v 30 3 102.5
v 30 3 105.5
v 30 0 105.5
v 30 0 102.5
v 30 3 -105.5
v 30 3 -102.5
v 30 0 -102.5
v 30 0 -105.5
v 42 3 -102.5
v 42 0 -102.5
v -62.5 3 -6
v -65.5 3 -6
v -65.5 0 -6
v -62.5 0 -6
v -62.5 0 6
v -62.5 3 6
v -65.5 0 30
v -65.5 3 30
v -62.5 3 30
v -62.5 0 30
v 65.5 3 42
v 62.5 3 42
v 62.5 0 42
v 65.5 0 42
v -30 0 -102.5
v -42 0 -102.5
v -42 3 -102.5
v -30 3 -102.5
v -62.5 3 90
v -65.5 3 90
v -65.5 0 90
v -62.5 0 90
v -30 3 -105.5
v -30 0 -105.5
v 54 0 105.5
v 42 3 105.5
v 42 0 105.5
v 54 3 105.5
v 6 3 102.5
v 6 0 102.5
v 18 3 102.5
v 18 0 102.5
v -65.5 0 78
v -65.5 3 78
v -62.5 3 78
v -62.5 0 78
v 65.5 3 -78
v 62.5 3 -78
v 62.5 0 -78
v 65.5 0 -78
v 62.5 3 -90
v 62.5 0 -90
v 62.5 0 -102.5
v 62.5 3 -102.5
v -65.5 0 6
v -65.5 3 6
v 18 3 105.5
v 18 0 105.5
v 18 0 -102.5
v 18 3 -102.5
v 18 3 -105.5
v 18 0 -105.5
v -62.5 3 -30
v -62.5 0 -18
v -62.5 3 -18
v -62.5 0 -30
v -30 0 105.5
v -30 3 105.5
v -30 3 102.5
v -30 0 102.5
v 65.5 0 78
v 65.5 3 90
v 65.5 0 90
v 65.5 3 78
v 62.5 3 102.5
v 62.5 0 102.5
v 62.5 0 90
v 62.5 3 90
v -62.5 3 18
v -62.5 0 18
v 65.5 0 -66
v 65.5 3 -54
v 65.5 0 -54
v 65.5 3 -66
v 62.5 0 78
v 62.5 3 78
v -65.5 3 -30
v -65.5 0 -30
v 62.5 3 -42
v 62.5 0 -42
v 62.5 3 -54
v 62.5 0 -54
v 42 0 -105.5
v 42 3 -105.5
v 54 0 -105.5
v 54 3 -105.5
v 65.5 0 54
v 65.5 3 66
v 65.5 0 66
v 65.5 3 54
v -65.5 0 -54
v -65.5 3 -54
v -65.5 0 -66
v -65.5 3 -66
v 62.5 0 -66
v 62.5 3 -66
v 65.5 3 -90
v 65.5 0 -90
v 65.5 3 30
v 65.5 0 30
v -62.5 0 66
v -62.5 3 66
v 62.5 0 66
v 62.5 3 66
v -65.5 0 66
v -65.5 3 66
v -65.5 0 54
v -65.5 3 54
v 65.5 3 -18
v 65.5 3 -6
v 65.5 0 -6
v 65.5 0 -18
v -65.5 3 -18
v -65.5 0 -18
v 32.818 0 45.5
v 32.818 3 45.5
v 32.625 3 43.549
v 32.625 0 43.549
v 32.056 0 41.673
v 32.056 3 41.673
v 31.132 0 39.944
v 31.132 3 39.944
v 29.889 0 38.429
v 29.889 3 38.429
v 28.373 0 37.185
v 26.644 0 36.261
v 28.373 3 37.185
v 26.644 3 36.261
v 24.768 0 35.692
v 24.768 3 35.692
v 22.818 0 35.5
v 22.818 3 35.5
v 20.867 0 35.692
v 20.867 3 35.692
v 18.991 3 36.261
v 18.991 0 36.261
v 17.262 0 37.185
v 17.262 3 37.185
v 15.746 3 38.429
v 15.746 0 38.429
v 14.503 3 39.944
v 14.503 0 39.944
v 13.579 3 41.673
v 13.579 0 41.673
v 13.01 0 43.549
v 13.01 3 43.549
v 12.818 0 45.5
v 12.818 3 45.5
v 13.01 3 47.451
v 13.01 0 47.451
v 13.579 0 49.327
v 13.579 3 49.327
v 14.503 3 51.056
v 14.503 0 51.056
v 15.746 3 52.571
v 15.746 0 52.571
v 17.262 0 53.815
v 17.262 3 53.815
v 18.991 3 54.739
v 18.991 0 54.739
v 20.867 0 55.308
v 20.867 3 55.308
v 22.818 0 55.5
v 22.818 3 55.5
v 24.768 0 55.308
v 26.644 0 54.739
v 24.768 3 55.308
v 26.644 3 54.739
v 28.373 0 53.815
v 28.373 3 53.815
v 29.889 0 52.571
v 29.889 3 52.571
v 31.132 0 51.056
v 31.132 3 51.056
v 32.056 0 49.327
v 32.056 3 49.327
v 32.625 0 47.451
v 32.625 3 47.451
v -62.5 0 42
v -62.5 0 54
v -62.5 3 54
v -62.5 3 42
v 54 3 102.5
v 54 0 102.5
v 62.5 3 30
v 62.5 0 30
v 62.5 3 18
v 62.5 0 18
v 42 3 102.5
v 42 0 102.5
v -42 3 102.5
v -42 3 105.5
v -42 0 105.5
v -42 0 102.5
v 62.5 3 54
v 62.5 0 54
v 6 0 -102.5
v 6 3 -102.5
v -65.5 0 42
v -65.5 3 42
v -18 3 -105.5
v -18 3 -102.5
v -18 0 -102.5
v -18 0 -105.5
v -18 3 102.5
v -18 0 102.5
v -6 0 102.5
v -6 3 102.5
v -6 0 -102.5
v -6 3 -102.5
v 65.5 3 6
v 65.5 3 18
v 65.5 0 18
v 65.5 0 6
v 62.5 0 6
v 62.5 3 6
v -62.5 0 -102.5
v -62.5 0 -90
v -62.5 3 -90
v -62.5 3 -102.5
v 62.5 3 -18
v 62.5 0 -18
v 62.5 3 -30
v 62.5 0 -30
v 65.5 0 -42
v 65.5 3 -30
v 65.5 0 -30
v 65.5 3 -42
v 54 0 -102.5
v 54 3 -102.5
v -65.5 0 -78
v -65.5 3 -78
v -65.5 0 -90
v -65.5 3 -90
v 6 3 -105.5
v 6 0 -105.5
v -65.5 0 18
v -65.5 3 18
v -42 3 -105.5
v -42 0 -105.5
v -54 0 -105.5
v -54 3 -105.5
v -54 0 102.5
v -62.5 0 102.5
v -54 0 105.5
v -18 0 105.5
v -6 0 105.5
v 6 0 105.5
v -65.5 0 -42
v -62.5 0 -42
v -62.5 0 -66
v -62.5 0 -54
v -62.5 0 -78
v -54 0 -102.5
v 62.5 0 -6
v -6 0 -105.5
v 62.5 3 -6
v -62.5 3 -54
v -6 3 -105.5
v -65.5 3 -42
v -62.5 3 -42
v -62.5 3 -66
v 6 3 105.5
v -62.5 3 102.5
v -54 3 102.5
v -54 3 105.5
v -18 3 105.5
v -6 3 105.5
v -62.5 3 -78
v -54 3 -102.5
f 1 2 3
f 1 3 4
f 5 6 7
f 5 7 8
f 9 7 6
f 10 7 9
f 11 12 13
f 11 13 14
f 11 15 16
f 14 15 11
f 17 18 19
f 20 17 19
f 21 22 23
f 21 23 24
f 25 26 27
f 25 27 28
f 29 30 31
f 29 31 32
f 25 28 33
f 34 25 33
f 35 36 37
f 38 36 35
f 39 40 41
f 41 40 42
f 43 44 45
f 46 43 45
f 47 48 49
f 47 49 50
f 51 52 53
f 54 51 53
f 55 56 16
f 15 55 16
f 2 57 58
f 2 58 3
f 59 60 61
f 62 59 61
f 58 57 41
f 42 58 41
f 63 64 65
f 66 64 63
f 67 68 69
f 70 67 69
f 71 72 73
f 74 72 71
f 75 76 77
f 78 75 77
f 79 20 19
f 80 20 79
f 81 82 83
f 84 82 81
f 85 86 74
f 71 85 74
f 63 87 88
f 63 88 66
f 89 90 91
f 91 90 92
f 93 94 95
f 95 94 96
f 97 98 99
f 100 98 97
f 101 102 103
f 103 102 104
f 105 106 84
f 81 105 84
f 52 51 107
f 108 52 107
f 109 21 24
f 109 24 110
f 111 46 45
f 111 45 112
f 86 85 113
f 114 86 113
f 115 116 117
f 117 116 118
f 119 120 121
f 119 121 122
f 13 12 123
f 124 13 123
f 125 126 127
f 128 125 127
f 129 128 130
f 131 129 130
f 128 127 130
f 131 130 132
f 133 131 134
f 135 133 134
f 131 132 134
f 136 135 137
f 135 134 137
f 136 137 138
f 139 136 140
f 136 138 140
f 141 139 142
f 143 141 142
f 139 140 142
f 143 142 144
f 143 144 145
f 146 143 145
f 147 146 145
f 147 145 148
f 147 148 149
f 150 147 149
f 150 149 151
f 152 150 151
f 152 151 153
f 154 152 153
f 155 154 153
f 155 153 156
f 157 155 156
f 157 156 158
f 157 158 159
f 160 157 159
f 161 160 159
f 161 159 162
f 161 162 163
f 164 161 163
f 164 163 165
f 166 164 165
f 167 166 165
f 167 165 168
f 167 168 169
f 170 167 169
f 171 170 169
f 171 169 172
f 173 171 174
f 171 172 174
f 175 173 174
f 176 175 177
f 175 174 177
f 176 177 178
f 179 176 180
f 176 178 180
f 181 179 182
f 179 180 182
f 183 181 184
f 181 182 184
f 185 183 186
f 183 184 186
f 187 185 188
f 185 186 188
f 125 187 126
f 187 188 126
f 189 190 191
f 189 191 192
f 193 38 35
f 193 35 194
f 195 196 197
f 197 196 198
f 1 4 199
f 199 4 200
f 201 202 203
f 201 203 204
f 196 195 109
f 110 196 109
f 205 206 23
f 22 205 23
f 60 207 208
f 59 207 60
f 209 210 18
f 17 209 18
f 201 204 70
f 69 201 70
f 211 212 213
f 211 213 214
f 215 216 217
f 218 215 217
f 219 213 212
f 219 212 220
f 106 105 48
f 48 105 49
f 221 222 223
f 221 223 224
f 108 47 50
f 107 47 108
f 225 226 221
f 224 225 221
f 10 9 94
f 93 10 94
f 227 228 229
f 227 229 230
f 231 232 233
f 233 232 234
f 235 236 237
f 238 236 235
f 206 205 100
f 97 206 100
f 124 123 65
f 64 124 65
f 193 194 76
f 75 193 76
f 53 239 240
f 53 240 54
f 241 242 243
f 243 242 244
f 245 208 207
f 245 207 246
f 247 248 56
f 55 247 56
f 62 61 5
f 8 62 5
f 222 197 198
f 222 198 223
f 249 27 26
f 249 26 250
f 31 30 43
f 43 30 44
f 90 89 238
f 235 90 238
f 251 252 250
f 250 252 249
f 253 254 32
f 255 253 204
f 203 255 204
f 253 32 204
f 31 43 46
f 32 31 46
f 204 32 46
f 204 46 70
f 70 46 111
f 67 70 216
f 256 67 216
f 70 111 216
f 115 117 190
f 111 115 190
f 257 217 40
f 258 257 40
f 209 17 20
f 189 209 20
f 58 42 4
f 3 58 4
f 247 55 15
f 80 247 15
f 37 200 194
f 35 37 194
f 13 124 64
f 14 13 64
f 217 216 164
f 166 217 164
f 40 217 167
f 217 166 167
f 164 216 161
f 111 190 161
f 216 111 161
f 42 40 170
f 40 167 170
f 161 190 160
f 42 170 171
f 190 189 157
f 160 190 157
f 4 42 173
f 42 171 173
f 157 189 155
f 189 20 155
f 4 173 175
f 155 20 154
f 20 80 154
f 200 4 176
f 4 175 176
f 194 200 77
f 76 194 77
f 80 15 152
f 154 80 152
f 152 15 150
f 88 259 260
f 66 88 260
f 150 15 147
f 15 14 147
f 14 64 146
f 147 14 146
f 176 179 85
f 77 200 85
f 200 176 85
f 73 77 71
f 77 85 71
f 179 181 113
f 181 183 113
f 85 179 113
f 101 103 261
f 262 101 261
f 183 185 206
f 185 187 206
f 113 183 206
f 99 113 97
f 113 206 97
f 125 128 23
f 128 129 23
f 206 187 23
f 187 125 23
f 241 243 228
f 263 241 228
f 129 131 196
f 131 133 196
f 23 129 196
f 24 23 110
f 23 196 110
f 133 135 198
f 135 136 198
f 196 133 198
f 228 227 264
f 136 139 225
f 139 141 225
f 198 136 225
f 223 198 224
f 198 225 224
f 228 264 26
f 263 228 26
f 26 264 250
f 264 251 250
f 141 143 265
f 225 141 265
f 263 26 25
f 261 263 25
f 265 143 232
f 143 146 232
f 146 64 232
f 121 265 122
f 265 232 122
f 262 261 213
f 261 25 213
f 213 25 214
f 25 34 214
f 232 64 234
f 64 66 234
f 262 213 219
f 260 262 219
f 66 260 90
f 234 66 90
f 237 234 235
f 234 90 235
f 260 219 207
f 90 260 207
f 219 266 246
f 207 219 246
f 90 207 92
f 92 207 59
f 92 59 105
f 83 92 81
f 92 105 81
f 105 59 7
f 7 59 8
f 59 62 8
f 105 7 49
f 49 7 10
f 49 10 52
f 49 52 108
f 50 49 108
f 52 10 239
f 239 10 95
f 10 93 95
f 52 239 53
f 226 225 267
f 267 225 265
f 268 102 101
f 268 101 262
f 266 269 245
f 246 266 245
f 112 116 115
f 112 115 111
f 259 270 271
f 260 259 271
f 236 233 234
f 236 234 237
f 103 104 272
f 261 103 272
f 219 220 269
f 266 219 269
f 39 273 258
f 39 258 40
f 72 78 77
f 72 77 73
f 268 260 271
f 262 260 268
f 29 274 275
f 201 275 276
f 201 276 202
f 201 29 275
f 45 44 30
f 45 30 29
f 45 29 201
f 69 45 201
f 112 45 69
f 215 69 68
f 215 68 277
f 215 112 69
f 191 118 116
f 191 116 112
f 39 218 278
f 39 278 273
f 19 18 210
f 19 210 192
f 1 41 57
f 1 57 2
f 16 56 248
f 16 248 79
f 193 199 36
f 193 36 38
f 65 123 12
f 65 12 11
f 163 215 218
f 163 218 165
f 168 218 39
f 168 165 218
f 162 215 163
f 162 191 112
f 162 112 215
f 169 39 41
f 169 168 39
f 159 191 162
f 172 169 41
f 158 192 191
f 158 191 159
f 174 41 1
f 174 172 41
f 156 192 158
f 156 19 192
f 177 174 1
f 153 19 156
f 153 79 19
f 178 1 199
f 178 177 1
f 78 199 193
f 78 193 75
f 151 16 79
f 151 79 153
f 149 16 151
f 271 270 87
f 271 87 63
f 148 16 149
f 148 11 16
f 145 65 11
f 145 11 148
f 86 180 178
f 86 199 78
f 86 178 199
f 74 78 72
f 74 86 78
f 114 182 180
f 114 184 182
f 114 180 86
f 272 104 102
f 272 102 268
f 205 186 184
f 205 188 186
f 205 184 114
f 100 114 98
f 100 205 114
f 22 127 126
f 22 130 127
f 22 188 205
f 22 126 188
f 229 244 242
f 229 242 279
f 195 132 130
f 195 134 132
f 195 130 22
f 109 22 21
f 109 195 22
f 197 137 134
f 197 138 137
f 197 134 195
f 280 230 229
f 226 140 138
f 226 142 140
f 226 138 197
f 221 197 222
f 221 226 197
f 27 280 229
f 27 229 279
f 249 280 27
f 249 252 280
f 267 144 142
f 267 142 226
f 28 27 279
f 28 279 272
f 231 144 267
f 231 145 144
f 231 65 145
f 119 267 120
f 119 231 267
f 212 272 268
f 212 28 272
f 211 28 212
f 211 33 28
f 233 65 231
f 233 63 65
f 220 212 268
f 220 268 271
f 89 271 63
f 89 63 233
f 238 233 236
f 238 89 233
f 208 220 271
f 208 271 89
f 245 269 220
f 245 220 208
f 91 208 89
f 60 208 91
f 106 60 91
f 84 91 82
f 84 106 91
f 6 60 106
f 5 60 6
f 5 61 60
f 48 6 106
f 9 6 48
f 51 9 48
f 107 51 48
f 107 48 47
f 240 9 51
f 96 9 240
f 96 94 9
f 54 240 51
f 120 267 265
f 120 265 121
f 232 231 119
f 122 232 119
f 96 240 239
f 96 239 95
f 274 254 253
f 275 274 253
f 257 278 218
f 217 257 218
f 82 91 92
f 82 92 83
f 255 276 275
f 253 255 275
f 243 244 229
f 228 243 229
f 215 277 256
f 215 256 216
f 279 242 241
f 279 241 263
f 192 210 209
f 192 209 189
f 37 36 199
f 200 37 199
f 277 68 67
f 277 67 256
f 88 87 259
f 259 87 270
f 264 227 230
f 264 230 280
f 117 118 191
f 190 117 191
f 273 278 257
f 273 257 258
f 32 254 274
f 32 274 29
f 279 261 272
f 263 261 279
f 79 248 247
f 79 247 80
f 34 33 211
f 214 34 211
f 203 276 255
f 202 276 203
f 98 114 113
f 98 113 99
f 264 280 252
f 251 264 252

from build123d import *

# Parameters (mm, degrees)
SKETCH3_W           = 125
SKETCH3_H           = 205
BOSS_EXTRUDE1_DEPTH = 3
SKETCH5_W           = 12
SKETCH5_H           = 3
SKETCH5_W_2         = 3
SKETCH5_H_2         = 12
BOSS_EXTRUDE2_DEPTH = 3
SKETCH6_R           = 10
CUT_EXTRUDE1_DEPTH  = 6


with BuildPart() as part:
    # Sketch3 → Boss-Extrude1 (new body)
    with BuildSketch(Plane(origin=(0, 0, 0), x_dir=(1, 0, 0), z_dir=(0, 1, 0))):
        Rectangle(SKETCH3_W, SKETCH3_H)
    extrude(amount=BOSS_EXTRUDE1_DEPTH)

    # Sketch5 → Boss-Extrude2 (add)
    with BuildSketch(Plane(origin=(0, 3, 0), x_dir=(1, 0, 0), z_dir=(0, 1, 0))):
        with Locations((24, -104)):
            Rectangle(SKETCH5_W, SKETCH5_H)
        with Locations((0, -104)):
            Rectangle(SKETCH5_W, SKETCH5_H)
        with Locations((-64, -84)):
            Rectangle(SKETCH5_W_2, SKETCH5_H_2)
        with Locations((-64, -60)):
            Rectangle(SKETCH5_W_2, SKETCH5_H_2)
        with Locations((-64, -12)):
            Rectangle(SKETCH5_W_2, SKETCH5_H_2)
        with Locations((64, -84)):
            Rectangle(SKETCH5_W_2, SKETCH5_H_2)
        with Locations((64, -36)):
            Rectangle(SKETCH5_W_2, SKETCH5_H_2)
        with Locations((64, -12)):
            Rectangle(SKETCH5_W_2, SKETCH5_H_2)
        with Locations((64, 12)):
            Rectangle(SKETCH5_W_2, SKETCH5_H_2)
        with Locations((64, 36)):
            Rectangle(SKETCH5_W_2, SKETCH5_H_2)
        with Locations((64, 84)):
            Rectangle(SKETCH5_W_2, SKETCH5_H_2)
        with Locations((24, 104)):
            Rectangle(SKETCH5_W, SKETCH5_H)
        with Locations((0, 104)):
            Rectangle(SKETCH5_W, SKETCH5_H)
        with Locations((-24, 104)):
            Rectangle(SKETCH5_W, SKETCH5_H)
        with Locations((-48, 104)):
            Rectangle(SKETCH5_W, SKETCH5_H)
        with Locations((-64, 36)):
            Rectangle(SKETCH5_W_2, SKETCH5_H_2)
        with Locations((-64, 12)):
            Rectangle(SKETCH5_W_2, SKETCH5_H_2)
        with Locations((48, -104)):
            Rectangle(SKETCH5_W, SKETCH5_H)
        with Locations((-24, -104)):
            Rectangle(SKETCH5_W, SKETCH5_H)
        with Locations((-48, -104)):
            Rectangle(SKETCH5_W, SKETCH5_H)
        with Locations((-64, -36)):
            Rectangle(SKETCH5_W_2, SKETCH5_H_2)
        with Locations((64, -60)):
            Rectangle(SKETCH5_W_2, SKETCH5_H_2)
        with Locations((64, 60)):
            Rectangle(SKETCH5_W_2, SKETCH5_H_2)
        with Locations((48, 104)):
            Rectangle(SKETCH5_W, SKETCH5_H)
        with Locations((-64, 84)):
            Rectangle(SKETCH5_W_2, SKETCH5_H_2)
        with Locations((-64, 60)):
            Rectangle(SKETCH5_W_2, SKETCH5_H_2)
    extrude(amount=-BOSS_EXTRUDE2_DEPTH)

    # Sketch6 → Cut-Extrude1 (cut)
    with BuildSketch(Plane(origin=(0, 3, 0), x_dir=(1, 0, 0), z_dir=(0, 1, 0))):
        with Locations((22.817541634, -45.5)):
            Circle(SKETCH6_R)
    extrude(amount=-CUT_EXTRUDE1_DEPTH, mode=Mode.SUBTRACT)


solid = part.part
